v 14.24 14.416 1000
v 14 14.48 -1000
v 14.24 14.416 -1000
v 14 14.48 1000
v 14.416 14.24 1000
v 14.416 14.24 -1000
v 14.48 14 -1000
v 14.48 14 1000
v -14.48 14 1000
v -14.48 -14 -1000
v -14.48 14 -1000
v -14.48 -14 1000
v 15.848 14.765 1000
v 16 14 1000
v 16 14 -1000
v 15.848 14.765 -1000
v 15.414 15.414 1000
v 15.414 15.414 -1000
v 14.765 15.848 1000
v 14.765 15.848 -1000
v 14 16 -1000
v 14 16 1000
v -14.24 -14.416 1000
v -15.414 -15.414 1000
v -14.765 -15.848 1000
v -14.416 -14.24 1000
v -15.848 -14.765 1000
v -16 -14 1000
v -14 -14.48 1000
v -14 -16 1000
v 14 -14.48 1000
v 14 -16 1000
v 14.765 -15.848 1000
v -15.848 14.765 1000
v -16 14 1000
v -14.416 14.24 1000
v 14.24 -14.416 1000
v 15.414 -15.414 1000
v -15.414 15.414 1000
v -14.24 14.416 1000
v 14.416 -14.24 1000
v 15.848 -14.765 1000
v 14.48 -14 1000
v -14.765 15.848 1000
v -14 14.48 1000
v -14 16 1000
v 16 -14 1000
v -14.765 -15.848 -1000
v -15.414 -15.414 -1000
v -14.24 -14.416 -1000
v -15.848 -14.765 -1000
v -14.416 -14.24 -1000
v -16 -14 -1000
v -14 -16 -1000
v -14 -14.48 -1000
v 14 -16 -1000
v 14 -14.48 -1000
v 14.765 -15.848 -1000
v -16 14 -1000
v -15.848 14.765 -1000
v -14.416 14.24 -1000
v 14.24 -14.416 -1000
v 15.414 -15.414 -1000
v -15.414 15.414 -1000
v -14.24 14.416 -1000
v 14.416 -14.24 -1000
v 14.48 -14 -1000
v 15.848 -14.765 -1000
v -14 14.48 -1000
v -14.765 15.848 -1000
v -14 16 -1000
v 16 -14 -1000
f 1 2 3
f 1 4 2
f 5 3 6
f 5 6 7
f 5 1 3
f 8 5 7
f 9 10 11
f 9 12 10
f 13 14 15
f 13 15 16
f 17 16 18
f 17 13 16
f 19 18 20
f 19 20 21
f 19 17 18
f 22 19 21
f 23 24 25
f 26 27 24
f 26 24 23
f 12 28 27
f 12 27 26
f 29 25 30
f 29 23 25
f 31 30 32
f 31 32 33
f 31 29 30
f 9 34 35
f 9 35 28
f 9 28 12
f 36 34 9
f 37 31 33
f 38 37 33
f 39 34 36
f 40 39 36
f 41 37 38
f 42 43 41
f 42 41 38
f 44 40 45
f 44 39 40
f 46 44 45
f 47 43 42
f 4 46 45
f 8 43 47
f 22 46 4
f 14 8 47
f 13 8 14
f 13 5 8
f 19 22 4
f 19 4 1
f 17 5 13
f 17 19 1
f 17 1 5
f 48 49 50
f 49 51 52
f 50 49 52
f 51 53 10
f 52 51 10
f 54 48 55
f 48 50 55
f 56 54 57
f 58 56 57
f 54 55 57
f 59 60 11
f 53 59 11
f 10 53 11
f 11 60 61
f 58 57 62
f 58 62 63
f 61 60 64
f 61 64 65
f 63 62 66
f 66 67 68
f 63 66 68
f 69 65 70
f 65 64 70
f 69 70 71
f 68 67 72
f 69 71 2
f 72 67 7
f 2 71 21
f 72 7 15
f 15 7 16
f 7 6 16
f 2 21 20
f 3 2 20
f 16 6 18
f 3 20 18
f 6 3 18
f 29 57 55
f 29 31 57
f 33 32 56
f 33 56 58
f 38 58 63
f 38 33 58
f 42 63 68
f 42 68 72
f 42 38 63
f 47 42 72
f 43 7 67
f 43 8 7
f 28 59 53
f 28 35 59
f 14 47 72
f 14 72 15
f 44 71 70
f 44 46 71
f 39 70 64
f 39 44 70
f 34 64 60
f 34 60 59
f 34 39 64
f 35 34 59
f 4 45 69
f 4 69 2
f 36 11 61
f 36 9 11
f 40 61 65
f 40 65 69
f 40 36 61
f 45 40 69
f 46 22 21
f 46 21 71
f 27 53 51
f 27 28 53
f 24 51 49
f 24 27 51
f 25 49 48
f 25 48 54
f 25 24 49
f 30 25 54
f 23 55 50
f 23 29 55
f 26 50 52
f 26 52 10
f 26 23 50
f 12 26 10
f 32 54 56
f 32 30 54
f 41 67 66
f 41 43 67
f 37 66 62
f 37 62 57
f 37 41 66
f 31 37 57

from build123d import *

# Parameters (mm, degrees)
BOSS_EXTRUDE1_DEPTH      = 1000
BOSS_EXTRUDE1_DEPTH_BACK = 1000


with BuildPart() as part:
    # Sketch1 → Boss-Extrude1 (new, two sides: drawn at the far end of the back side and taken through both)
    with BuildSketch(Plane.XY.offset(-BOSS_EXTRUDE1_DEPTH_BACK)):
        with BuildLine():
            Line((-14, -16), (14, -16))
            ThreePointArc((14, -16), (15.414213562, -15.414213562), (16, -14))
            Line((16, -14), (16, 14))
            ThreePointArc((16, 14), (15.414213562, 15.414213562), (14, 16))
            Line((14, 16), (-14, 16))
            ThreePointArc((-14, 16), (-15.414213562, 15.414213562), (-16, 14))
            Line((-16, 14), (-16, -14))
            ThreePointArc((-16, -14), (-15.414213562, -15.414213562), (-14, -16))
        make_face()
        with BuildLine():
            Line((-14, 14.48), (14, 14.48))
            ThreePointArc((14, 14.48), (14.339411255, 14.339411255), (14.48, 14))
            Line((14.48, 14), (14.48, -14))
            ThreePointArc((14.48, -14), (14.339411255, -14.339411255), (14, -14.48))
            Line((14, -14.48), (-14, -14.48))
            ThreePointArc((-14, -14.48), (-14.339411255, -14.339411255), (-14.48, -14))
            Line((-14.48, -14), (-14.48, 14))
            ThreePointArc((-14.48, 14), (-14.339411255, 14.339411255), (-14, 14.48))
        make_face(mode=Mode.SUBTRACT)
    extrude(amount=BOSS_EXTRUDE1_DEPTH + BOSS_EXTRUDE1_DEPTH_BACK)


solid = part.part
